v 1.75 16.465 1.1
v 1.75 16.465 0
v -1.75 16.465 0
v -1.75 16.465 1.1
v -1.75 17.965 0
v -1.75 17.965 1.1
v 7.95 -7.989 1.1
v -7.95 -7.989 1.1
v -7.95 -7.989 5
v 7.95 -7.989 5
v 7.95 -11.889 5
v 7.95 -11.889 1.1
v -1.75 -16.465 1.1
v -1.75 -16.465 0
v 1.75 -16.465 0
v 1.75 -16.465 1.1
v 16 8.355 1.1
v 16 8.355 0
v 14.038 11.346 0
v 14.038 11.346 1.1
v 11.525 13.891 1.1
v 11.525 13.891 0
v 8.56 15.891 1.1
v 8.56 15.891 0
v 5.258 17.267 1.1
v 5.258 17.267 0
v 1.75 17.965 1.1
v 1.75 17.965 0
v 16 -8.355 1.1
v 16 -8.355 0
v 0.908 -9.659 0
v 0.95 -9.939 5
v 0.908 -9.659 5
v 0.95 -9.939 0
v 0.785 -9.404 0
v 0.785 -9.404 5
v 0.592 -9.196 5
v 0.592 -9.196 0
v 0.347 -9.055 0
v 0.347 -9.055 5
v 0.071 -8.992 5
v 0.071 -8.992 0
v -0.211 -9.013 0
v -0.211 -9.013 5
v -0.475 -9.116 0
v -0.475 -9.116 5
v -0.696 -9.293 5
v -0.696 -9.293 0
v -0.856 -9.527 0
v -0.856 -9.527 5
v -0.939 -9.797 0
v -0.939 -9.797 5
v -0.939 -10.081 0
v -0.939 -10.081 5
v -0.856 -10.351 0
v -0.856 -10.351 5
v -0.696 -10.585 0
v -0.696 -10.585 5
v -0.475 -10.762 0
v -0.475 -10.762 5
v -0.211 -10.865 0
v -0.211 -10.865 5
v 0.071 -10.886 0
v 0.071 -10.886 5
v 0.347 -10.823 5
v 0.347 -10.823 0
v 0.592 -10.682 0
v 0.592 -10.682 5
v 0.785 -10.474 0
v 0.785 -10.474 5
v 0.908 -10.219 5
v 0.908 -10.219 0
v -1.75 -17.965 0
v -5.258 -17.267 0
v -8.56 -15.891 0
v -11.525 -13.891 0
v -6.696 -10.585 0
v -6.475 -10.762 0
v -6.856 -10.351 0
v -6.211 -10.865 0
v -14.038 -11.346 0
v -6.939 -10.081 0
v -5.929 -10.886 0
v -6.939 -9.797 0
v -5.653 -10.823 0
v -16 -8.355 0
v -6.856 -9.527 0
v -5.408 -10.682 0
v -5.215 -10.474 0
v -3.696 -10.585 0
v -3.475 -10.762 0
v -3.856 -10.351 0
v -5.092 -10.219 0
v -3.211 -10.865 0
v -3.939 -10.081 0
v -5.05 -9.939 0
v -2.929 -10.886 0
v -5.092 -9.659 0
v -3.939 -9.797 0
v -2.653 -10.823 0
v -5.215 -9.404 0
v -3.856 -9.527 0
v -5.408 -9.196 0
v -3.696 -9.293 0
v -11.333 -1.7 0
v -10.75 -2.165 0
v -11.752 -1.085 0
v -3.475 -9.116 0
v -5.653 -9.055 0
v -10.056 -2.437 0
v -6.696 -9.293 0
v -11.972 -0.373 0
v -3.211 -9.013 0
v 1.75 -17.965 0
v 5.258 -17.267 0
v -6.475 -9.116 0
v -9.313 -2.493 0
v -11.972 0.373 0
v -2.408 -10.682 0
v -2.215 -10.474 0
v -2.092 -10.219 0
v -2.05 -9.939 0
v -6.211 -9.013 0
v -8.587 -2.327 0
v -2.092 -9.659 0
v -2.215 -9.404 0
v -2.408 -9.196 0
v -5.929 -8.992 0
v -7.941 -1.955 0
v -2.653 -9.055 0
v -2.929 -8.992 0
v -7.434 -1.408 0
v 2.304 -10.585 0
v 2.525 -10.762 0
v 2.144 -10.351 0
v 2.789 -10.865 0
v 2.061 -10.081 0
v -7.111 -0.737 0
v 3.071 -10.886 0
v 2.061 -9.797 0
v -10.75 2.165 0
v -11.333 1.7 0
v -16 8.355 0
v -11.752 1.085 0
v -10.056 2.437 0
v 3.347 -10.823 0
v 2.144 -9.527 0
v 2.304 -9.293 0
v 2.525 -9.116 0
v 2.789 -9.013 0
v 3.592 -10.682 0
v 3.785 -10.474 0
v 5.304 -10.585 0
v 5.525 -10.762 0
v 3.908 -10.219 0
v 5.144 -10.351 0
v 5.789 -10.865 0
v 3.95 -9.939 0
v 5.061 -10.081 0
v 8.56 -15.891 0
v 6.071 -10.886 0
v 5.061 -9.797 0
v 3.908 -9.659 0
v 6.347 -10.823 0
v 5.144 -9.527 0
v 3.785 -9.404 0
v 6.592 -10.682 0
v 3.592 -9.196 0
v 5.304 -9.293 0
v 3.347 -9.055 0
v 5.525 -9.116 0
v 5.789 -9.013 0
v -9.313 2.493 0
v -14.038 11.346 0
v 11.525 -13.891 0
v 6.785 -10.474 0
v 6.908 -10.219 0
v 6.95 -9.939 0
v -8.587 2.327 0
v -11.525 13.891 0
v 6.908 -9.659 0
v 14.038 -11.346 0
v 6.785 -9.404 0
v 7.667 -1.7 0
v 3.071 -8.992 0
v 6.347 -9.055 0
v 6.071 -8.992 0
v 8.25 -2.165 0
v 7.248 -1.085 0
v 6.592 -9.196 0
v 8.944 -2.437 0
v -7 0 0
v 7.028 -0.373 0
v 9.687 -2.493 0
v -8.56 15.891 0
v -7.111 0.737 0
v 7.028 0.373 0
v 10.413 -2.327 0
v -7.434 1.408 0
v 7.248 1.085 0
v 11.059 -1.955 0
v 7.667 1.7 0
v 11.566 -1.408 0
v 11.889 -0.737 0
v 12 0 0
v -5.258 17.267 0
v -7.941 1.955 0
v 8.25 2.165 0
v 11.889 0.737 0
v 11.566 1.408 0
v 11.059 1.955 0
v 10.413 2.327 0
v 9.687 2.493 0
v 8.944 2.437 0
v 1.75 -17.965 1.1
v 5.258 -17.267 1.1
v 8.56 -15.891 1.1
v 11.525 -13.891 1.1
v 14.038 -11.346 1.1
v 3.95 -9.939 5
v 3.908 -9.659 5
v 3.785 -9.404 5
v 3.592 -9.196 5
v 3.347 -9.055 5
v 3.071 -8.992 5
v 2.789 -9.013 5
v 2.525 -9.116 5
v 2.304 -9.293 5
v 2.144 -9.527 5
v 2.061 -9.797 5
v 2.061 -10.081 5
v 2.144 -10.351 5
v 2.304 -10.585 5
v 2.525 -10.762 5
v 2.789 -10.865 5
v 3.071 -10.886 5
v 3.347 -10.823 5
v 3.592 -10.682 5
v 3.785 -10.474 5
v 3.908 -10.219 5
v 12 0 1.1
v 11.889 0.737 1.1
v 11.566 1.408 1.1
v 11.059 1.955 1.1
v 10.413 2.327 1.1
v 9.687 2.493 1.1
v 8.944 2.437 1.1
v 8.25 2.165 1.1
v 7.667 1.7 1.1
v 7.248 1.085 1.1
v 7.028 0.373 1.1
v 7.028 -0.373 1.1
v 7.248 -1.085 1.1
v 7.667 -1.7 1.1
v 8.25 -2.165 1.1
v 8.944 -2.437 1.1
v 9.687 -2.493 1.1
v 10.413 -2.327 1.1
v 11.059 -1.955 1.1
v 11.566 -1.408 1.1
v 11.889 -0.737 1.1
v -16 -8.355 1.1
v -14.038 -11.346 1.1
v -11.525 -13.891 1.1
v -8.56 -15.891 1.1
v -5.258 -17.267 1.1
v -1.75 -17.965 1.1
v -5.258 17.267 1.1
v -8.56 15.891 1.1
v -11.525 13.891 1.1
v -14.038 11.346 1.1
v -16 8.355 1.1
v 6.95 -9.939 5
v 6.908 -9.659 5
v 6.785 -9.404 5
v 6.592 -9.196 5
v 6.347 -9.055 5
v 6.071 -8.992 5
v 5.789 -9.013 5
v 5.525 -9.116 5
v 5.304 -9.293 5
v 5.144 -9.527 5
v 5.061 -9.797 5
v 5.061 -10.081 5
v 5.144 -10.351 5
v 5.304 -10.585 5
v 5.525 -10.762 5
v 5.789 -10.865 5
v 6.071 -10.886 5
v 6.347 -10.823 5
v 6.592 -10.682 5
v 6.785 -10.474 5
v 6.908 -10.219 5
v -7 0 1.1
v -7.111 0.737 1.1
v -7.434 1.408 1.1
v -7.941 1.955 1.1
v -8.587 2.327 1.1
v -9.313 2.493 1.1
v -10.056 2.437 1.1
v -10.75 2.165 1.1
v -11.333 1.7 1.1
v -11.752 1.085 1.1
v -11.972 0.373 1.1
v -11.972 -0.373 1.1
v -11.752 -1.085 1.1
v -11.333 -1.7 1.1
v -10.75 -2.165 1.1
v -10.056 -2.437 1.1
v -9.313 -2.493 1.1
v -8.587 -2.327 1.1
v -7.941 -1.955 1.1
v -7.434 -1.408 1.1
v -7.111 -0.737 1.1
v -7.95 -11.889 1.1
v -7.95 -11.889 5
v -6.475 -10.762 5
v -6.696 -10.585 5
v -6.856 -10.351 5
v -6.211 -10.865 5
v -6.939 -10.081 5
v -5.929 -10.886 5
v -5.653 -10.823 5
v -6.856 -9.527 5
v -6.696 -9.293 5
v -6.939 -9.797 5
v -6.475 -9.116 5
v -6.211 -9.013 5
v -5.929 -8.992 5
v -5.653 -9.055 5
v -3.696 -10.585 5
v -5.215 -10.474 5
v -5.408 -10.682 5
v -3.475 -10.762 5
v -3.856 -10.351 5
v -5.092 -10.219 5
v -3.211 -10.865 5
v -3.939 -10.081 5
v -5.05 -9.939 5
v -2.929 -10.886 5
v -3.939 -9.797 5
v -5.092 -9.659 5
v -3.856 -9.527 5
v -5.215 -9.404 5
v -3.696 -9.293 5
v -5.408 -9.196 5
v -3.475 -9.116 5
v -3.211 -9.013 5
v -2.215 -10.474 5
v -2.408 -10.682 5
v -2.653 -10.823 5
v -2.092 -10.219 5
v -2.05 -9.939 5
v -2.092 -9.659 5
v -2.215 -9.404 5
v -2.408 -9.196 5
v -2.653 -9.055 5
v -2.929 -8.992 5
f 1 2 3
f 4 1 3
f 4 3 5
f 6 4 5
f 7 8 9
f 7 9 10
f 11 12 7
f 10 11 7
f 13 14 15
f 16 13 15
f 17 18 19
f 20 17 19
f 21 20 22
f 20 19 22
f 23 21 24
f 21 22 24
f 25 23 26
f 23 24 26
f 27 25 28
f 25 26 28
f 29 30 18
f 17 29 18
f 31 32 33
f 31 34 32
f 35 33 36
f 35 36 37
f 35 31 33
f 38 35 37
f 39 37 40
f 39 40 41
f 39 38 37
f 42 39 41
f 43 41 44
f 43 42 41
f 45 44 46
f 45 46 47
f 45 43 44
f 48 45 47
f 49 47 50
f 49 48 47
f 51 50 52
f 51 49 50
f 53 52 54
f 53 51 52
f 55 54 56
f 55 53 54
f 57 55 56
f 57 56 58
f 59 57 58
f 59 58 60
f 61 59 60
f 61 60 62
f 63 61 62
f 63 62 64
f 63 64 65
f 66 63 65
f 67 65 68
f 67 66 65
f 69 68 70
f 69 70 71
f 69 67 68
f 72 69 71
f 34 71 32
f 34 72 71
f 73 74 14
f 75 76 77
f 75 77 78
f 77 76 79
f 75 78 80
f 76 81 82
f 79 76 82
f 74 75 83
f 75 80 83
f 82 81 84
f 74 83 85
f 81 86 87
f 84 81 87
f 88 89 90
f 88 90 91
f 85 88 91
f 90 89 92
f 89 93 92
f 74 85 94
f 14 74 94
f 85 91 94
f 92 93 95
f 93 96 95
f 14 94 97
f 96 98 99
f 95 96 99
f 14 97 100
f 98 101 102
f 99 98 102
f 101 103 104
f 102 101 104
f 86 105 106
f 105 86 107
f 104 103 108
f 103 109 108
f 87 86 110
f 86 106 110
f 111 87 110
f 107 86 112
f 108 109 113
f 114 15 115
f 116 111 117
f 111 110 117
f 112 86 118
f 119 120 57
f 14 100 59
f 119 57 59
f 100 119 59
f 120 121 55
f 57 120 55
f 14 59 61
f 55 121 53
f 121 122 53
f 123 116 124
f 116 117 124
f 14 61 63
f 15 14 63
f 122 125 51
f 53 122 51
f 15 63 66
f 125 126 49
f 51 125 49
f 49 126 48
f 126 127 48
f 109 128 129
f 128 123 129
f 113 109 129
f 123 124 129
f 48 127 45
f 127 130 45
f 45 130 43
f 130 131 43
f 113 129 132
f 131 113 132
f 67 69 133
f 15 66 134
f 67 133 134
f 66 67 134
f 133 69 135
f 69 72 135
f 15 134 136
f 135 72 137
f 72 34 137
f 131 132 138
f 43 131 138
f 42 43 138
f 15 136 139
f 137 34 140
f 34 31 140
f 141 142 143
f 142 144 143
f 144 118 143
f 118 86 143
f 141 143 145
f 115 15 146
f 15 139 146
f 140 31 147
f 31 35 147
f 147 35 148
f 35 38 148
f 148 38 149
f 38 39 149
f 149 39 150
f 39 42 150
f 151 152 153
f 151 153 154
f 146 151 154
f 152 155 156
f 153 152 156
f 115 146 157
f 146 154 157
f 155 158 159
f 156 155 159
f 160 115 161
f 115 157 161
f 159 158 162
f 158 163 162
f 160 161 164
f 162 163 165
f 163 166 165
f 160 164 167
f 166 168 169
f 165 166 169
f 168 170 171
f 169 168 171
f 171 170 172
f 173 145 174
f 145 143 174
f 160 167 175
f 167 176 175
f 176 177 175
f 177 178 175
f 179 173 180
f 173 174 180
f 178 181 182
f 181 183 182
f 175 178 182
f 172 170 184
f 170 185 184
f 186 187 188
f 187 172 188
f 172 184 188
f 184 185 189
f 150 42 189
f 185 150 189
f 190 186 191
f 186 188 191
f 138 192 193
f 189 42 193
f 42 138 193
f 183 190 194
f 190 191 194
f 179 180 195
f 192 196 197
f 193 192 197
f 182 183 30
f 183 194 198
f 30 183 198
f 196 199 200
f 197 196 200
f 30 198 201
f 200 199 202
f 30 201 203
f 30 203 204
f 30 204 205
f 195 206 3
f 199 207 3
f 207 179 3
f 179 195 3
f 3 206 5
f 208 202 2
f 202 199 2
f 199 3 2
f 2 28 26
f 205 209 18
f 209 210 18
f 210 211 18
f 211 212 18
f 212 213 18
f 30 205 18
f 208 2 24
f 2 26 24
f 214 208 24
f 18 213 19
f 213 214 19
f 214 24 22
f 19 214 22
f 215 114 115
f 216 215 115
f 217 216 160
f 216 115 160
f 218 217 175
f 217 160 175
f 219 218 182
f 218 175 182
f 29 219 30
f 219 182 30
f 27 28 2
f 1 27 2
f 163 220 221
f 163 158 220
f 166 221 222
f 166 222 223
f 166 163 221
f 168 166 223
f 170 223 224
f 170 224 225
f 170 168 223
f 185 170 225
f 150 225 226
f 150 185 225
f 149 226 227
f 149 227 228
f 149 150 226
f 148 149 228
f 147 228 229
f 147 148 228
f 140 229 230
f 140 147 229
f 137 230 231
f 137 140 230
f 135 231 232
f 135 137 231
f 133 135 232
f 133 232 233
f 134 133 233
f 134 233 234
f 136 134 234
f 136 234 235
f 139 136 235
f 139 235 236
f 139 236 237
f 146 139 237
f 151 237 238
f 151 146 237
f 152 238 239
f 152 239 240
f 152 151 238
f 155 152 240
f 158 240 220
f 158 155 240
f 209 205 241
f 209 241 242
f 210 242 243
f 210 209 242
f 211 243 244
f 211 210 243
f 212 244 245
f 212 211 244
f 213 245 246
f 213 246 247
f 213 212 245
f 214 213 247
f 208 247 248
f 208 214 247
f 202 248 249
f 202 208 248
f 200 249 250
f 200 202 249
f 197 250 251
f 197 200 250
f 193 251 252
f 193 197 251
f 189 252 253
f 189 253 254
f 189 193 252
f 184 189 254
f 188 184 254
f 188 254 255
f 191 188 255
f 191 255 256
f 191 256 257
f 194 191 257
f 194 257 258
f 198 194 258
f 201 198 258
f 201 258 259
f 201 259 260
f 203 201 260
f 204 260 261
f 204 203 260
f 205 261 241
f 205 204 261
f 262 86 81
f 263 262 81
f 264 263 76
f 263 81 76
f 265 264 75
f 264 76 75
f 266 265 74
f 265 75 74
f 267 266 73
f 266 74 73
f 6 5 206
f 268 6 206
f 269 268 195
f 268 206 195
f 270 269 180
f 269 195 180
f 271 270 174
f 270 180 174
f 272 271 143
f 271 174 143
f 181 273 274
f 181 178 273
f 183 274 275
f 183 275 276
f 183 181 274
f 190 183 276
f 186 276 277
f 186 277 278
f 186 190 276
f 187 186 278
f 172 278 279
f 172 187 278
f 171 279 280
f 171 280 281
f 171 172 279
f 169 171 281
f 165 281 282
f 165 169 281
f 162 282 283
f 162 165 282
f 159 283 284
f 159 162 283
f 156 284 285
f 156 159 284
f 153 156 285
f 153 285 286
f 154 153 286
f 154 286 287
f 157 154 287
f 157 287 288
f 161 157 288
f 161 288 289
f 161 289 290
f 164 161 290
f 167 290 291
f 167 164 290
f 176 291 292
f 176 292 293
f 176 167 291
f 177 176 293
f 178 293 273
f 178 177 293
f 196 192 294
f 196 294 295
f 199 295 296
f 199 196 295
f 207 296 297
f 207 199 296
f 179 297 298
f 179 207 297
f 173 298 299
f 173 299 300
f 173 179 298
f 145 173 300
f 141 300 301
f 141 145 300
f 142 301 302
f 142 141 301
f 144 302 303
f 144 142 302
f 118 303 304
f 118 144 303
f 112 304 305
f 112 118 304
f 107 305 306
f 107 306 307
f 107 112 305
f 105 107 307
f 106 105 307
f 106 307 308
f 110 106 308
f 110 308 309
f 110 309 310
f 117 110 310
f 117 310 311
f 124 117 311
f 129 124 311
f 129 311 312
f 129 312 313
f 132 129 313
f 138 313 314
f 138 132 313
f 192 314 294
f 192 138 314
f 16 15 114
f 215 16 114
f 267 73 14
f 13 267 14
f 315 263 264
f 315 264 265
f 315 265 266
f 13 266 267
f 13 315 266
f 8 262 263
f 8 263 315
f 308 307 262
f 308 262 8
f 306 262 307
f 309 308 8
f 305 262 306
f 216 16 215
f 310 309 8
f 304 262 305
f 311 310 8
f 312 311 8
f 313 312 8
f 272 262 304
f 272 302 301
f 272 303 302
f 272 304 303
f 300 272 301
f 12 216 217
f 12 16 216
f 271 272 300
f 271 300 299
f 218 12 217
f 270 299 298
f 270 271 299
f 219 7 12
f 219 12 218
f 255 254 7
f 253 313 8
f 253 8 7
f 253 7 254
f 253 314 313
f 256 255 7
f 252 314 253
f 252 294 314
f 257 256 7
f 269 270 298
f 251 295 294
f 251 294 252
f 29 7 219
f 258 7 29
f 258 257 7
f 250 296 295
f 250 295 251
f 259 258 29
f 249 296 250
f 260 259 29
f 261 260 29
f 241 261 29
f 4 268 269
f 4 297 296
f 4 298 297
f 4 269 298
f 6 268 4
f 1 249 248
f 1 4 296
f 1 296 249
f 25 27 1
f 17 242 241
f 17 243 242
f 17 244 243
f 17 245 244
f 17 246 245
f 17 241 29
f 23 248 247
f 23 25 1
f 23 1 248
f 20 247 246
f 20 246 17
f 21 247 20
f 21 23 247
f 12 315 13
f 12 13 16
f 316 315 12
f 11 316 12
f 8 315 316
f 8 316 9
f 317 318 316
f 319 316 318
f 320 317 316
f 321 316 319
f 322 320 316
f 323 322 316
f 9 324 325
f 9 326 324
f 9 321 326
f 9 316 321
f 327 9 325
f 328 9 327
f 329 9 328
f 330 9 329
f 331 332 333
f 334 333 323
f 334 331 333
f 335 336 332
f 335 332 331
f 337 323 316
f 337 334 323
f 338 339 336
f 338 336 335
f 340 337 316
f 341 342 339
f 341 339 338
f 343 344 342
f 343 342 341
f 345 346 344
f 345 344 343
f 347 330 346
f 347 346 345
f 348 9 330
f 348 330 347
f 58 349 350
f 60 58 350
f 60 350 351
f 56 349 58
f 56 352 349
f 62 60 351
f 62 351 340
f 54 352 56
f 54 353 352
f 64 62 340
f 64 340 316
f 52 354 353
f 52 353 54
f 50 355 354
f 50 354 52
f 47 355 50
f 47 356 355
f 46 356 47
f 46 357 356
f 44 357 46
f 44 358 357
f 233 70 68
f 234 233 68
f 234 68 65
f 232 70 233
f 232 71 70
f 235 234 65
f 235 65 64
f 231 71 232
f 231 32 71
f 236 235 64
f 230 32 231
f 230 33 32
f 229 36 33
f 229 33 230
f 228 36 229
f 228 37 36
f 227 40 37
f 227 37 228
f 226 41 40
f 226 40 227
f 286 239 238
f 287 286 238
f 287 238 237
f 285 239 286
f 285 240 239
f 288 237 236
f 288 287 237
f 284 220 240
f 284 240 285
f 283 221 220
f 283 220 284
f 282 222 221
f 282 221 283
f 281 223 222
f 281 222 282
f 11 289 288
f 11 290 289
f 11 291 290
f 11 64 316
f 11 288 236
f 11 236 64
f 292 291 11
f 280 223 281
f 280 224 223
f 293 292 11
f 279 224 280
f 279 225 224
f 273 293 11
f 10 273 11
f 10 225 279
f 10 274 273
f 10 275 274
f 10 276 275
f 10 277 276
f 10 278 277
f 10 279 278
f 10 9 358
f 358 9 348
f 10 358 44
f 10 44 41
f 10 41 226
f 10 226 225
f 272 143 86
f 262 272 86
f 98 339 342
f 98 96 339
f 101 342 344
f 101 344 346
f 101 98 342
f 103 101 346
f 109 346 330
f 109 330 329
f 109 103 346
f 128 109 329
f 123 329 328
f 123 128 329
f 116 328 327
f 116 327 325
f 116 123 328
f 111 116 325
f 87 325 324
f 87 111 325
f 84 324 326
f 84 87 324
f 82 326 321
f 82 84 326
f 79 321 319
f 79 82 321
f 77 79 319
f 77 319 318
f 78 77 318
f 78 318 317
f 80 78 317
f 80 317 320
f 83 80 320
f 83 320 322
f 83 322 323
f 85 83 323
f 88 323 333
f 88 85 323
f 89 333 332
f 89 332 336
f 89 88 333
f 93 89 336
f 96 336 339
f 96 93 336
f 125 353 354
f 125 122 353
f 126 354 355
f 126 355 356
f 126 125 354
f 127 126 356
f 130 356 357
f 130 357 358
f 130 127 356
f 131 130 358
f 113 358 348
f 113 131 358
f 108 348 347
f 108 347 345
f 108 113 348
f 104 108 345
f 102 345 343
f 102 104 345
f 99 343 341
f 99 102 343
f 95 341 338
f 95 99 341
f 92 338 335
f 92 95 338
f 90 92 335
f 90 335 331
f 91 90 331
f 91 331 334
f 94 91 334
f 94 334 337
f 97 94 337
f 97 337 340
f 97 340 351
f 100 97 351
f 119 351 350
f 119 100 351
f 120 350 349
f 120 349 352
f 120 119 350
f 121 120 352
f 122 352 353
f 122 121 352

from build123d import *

# Parameters (mm, degrees)
IZIM1_R                     = 0.95
IZIM1_R_2                   = 2.5
Y_KSEKLIK_EKSTR_ZYON4_DEPTH = 1.1
IZIM2_W                     = 15.9
IZIM2_H                     = 3.9
IZIM2_R                     = 0.95
Y_KSEKLIK_EKSTR_ZYON5_DEPTH = 3.9


with BuildPart() as part:
    # Çizim1 → Yükseklik-Ekstrüzyon4 (new body)
    with BuildSketch(Plane.XY):
        with BuildLine():
            ThreePointArc((-16, -8.354789046), (-10.092299035, -14.964892254), (-1.75, -17.964965906))
            Line((-1.75, -17.964965906), (-1.75, -16.464965906))
            Line((-1.75, -16.464965906), (1.75, -16.464965906))
            Line((1.75, -16.464965906), (1.75, -17.964965906))
            ThreePointArc((1.75, -17.964965906), (10.092299035, -14.964892254), (16, -8.354789046))
            Line((16, -8.354789046), (16, 8.354789046))
            ThreePointArc((16, 8.354789046), (10.092299035, 14.964892254), (1.75, 17.964965906))
            Line((1.75, 17.964965906), (1.75, 16.464965906))
            Line((1.75, 16.464965906), (-1.75, 16.464965906))
            Line((-1.75, 16.464965906), (-1.75, 17.964965906))
            ThreePointArc((-1.75, 17.964965906), (-10.092299035, 14.964892254), (-16, 8.354789046))
            Line((-16, 8.354789046), (-16, -8.354789046))
        make_face()
        with Locations((-6, -9.939079606)):
            Circle(IZIM1_R, mode=Mode.SUBTRACT)
        with Locations((-3, -9.939079606)):
            Circle(IZIM1_R, mode=Mode.SUBTRACT)
        with Locations((0, -9.939079606)):
            Circle(IZIM1_R, mode=Mode.SUBTRACT)
        with Locations((3, -9.939079606)):
            Circle(IZIM1_R, mode=Mode.SUBTRACT)
        with Locations((6, -9.939079606)):
            Circle(IZIM1_R, mode=Mode.SUBTRACT)
        with Locations((-9.5, 0)):
            Circle(IZIM1_R_2, mode=Mode.SUBTRACT)
        with Locations((9.5, 0)):
            Circle(IZIM1_R_2, mode=Mode.SUBTRACT)
    extrude(amount=Y_KSEKLIK_EKSTR_ZYON4_DEPTH)

    # Çizim2 → Yükseklik-Ekstrüzyon5 (add)
    with BuildSketch(Plane.XY.offset(1.1)):
        with Locations((0, -9.939079606)):
            Rectangle(IZIM2_W, IZIM2_H)
        with Locations((-6, -9.939079606)):
            Circle(IZIM2_R, mode=Mode.SUBTRACT)
        with Locations((3, -9.939079606)):
            Circle(IZIM2_R, mode=Mode.SUBTRACT)
        with Locations((0, -9.939079606)):
            Circle(IZIM2_R, mode=Mode.SUBTRACT)
        with Locations((6, -9.939079606)):
            Circle(IZIM2_R, mode=Mode.SUBTRACT)
        with Locations((-3, -9.939079606)):
            Circle(IZIM2_R, mode=Mode.SUBTRACT)
    extrude(amount=Y_KSEKLIK_EKSTR_ZYON5_DEPTH)


solid = part.part
